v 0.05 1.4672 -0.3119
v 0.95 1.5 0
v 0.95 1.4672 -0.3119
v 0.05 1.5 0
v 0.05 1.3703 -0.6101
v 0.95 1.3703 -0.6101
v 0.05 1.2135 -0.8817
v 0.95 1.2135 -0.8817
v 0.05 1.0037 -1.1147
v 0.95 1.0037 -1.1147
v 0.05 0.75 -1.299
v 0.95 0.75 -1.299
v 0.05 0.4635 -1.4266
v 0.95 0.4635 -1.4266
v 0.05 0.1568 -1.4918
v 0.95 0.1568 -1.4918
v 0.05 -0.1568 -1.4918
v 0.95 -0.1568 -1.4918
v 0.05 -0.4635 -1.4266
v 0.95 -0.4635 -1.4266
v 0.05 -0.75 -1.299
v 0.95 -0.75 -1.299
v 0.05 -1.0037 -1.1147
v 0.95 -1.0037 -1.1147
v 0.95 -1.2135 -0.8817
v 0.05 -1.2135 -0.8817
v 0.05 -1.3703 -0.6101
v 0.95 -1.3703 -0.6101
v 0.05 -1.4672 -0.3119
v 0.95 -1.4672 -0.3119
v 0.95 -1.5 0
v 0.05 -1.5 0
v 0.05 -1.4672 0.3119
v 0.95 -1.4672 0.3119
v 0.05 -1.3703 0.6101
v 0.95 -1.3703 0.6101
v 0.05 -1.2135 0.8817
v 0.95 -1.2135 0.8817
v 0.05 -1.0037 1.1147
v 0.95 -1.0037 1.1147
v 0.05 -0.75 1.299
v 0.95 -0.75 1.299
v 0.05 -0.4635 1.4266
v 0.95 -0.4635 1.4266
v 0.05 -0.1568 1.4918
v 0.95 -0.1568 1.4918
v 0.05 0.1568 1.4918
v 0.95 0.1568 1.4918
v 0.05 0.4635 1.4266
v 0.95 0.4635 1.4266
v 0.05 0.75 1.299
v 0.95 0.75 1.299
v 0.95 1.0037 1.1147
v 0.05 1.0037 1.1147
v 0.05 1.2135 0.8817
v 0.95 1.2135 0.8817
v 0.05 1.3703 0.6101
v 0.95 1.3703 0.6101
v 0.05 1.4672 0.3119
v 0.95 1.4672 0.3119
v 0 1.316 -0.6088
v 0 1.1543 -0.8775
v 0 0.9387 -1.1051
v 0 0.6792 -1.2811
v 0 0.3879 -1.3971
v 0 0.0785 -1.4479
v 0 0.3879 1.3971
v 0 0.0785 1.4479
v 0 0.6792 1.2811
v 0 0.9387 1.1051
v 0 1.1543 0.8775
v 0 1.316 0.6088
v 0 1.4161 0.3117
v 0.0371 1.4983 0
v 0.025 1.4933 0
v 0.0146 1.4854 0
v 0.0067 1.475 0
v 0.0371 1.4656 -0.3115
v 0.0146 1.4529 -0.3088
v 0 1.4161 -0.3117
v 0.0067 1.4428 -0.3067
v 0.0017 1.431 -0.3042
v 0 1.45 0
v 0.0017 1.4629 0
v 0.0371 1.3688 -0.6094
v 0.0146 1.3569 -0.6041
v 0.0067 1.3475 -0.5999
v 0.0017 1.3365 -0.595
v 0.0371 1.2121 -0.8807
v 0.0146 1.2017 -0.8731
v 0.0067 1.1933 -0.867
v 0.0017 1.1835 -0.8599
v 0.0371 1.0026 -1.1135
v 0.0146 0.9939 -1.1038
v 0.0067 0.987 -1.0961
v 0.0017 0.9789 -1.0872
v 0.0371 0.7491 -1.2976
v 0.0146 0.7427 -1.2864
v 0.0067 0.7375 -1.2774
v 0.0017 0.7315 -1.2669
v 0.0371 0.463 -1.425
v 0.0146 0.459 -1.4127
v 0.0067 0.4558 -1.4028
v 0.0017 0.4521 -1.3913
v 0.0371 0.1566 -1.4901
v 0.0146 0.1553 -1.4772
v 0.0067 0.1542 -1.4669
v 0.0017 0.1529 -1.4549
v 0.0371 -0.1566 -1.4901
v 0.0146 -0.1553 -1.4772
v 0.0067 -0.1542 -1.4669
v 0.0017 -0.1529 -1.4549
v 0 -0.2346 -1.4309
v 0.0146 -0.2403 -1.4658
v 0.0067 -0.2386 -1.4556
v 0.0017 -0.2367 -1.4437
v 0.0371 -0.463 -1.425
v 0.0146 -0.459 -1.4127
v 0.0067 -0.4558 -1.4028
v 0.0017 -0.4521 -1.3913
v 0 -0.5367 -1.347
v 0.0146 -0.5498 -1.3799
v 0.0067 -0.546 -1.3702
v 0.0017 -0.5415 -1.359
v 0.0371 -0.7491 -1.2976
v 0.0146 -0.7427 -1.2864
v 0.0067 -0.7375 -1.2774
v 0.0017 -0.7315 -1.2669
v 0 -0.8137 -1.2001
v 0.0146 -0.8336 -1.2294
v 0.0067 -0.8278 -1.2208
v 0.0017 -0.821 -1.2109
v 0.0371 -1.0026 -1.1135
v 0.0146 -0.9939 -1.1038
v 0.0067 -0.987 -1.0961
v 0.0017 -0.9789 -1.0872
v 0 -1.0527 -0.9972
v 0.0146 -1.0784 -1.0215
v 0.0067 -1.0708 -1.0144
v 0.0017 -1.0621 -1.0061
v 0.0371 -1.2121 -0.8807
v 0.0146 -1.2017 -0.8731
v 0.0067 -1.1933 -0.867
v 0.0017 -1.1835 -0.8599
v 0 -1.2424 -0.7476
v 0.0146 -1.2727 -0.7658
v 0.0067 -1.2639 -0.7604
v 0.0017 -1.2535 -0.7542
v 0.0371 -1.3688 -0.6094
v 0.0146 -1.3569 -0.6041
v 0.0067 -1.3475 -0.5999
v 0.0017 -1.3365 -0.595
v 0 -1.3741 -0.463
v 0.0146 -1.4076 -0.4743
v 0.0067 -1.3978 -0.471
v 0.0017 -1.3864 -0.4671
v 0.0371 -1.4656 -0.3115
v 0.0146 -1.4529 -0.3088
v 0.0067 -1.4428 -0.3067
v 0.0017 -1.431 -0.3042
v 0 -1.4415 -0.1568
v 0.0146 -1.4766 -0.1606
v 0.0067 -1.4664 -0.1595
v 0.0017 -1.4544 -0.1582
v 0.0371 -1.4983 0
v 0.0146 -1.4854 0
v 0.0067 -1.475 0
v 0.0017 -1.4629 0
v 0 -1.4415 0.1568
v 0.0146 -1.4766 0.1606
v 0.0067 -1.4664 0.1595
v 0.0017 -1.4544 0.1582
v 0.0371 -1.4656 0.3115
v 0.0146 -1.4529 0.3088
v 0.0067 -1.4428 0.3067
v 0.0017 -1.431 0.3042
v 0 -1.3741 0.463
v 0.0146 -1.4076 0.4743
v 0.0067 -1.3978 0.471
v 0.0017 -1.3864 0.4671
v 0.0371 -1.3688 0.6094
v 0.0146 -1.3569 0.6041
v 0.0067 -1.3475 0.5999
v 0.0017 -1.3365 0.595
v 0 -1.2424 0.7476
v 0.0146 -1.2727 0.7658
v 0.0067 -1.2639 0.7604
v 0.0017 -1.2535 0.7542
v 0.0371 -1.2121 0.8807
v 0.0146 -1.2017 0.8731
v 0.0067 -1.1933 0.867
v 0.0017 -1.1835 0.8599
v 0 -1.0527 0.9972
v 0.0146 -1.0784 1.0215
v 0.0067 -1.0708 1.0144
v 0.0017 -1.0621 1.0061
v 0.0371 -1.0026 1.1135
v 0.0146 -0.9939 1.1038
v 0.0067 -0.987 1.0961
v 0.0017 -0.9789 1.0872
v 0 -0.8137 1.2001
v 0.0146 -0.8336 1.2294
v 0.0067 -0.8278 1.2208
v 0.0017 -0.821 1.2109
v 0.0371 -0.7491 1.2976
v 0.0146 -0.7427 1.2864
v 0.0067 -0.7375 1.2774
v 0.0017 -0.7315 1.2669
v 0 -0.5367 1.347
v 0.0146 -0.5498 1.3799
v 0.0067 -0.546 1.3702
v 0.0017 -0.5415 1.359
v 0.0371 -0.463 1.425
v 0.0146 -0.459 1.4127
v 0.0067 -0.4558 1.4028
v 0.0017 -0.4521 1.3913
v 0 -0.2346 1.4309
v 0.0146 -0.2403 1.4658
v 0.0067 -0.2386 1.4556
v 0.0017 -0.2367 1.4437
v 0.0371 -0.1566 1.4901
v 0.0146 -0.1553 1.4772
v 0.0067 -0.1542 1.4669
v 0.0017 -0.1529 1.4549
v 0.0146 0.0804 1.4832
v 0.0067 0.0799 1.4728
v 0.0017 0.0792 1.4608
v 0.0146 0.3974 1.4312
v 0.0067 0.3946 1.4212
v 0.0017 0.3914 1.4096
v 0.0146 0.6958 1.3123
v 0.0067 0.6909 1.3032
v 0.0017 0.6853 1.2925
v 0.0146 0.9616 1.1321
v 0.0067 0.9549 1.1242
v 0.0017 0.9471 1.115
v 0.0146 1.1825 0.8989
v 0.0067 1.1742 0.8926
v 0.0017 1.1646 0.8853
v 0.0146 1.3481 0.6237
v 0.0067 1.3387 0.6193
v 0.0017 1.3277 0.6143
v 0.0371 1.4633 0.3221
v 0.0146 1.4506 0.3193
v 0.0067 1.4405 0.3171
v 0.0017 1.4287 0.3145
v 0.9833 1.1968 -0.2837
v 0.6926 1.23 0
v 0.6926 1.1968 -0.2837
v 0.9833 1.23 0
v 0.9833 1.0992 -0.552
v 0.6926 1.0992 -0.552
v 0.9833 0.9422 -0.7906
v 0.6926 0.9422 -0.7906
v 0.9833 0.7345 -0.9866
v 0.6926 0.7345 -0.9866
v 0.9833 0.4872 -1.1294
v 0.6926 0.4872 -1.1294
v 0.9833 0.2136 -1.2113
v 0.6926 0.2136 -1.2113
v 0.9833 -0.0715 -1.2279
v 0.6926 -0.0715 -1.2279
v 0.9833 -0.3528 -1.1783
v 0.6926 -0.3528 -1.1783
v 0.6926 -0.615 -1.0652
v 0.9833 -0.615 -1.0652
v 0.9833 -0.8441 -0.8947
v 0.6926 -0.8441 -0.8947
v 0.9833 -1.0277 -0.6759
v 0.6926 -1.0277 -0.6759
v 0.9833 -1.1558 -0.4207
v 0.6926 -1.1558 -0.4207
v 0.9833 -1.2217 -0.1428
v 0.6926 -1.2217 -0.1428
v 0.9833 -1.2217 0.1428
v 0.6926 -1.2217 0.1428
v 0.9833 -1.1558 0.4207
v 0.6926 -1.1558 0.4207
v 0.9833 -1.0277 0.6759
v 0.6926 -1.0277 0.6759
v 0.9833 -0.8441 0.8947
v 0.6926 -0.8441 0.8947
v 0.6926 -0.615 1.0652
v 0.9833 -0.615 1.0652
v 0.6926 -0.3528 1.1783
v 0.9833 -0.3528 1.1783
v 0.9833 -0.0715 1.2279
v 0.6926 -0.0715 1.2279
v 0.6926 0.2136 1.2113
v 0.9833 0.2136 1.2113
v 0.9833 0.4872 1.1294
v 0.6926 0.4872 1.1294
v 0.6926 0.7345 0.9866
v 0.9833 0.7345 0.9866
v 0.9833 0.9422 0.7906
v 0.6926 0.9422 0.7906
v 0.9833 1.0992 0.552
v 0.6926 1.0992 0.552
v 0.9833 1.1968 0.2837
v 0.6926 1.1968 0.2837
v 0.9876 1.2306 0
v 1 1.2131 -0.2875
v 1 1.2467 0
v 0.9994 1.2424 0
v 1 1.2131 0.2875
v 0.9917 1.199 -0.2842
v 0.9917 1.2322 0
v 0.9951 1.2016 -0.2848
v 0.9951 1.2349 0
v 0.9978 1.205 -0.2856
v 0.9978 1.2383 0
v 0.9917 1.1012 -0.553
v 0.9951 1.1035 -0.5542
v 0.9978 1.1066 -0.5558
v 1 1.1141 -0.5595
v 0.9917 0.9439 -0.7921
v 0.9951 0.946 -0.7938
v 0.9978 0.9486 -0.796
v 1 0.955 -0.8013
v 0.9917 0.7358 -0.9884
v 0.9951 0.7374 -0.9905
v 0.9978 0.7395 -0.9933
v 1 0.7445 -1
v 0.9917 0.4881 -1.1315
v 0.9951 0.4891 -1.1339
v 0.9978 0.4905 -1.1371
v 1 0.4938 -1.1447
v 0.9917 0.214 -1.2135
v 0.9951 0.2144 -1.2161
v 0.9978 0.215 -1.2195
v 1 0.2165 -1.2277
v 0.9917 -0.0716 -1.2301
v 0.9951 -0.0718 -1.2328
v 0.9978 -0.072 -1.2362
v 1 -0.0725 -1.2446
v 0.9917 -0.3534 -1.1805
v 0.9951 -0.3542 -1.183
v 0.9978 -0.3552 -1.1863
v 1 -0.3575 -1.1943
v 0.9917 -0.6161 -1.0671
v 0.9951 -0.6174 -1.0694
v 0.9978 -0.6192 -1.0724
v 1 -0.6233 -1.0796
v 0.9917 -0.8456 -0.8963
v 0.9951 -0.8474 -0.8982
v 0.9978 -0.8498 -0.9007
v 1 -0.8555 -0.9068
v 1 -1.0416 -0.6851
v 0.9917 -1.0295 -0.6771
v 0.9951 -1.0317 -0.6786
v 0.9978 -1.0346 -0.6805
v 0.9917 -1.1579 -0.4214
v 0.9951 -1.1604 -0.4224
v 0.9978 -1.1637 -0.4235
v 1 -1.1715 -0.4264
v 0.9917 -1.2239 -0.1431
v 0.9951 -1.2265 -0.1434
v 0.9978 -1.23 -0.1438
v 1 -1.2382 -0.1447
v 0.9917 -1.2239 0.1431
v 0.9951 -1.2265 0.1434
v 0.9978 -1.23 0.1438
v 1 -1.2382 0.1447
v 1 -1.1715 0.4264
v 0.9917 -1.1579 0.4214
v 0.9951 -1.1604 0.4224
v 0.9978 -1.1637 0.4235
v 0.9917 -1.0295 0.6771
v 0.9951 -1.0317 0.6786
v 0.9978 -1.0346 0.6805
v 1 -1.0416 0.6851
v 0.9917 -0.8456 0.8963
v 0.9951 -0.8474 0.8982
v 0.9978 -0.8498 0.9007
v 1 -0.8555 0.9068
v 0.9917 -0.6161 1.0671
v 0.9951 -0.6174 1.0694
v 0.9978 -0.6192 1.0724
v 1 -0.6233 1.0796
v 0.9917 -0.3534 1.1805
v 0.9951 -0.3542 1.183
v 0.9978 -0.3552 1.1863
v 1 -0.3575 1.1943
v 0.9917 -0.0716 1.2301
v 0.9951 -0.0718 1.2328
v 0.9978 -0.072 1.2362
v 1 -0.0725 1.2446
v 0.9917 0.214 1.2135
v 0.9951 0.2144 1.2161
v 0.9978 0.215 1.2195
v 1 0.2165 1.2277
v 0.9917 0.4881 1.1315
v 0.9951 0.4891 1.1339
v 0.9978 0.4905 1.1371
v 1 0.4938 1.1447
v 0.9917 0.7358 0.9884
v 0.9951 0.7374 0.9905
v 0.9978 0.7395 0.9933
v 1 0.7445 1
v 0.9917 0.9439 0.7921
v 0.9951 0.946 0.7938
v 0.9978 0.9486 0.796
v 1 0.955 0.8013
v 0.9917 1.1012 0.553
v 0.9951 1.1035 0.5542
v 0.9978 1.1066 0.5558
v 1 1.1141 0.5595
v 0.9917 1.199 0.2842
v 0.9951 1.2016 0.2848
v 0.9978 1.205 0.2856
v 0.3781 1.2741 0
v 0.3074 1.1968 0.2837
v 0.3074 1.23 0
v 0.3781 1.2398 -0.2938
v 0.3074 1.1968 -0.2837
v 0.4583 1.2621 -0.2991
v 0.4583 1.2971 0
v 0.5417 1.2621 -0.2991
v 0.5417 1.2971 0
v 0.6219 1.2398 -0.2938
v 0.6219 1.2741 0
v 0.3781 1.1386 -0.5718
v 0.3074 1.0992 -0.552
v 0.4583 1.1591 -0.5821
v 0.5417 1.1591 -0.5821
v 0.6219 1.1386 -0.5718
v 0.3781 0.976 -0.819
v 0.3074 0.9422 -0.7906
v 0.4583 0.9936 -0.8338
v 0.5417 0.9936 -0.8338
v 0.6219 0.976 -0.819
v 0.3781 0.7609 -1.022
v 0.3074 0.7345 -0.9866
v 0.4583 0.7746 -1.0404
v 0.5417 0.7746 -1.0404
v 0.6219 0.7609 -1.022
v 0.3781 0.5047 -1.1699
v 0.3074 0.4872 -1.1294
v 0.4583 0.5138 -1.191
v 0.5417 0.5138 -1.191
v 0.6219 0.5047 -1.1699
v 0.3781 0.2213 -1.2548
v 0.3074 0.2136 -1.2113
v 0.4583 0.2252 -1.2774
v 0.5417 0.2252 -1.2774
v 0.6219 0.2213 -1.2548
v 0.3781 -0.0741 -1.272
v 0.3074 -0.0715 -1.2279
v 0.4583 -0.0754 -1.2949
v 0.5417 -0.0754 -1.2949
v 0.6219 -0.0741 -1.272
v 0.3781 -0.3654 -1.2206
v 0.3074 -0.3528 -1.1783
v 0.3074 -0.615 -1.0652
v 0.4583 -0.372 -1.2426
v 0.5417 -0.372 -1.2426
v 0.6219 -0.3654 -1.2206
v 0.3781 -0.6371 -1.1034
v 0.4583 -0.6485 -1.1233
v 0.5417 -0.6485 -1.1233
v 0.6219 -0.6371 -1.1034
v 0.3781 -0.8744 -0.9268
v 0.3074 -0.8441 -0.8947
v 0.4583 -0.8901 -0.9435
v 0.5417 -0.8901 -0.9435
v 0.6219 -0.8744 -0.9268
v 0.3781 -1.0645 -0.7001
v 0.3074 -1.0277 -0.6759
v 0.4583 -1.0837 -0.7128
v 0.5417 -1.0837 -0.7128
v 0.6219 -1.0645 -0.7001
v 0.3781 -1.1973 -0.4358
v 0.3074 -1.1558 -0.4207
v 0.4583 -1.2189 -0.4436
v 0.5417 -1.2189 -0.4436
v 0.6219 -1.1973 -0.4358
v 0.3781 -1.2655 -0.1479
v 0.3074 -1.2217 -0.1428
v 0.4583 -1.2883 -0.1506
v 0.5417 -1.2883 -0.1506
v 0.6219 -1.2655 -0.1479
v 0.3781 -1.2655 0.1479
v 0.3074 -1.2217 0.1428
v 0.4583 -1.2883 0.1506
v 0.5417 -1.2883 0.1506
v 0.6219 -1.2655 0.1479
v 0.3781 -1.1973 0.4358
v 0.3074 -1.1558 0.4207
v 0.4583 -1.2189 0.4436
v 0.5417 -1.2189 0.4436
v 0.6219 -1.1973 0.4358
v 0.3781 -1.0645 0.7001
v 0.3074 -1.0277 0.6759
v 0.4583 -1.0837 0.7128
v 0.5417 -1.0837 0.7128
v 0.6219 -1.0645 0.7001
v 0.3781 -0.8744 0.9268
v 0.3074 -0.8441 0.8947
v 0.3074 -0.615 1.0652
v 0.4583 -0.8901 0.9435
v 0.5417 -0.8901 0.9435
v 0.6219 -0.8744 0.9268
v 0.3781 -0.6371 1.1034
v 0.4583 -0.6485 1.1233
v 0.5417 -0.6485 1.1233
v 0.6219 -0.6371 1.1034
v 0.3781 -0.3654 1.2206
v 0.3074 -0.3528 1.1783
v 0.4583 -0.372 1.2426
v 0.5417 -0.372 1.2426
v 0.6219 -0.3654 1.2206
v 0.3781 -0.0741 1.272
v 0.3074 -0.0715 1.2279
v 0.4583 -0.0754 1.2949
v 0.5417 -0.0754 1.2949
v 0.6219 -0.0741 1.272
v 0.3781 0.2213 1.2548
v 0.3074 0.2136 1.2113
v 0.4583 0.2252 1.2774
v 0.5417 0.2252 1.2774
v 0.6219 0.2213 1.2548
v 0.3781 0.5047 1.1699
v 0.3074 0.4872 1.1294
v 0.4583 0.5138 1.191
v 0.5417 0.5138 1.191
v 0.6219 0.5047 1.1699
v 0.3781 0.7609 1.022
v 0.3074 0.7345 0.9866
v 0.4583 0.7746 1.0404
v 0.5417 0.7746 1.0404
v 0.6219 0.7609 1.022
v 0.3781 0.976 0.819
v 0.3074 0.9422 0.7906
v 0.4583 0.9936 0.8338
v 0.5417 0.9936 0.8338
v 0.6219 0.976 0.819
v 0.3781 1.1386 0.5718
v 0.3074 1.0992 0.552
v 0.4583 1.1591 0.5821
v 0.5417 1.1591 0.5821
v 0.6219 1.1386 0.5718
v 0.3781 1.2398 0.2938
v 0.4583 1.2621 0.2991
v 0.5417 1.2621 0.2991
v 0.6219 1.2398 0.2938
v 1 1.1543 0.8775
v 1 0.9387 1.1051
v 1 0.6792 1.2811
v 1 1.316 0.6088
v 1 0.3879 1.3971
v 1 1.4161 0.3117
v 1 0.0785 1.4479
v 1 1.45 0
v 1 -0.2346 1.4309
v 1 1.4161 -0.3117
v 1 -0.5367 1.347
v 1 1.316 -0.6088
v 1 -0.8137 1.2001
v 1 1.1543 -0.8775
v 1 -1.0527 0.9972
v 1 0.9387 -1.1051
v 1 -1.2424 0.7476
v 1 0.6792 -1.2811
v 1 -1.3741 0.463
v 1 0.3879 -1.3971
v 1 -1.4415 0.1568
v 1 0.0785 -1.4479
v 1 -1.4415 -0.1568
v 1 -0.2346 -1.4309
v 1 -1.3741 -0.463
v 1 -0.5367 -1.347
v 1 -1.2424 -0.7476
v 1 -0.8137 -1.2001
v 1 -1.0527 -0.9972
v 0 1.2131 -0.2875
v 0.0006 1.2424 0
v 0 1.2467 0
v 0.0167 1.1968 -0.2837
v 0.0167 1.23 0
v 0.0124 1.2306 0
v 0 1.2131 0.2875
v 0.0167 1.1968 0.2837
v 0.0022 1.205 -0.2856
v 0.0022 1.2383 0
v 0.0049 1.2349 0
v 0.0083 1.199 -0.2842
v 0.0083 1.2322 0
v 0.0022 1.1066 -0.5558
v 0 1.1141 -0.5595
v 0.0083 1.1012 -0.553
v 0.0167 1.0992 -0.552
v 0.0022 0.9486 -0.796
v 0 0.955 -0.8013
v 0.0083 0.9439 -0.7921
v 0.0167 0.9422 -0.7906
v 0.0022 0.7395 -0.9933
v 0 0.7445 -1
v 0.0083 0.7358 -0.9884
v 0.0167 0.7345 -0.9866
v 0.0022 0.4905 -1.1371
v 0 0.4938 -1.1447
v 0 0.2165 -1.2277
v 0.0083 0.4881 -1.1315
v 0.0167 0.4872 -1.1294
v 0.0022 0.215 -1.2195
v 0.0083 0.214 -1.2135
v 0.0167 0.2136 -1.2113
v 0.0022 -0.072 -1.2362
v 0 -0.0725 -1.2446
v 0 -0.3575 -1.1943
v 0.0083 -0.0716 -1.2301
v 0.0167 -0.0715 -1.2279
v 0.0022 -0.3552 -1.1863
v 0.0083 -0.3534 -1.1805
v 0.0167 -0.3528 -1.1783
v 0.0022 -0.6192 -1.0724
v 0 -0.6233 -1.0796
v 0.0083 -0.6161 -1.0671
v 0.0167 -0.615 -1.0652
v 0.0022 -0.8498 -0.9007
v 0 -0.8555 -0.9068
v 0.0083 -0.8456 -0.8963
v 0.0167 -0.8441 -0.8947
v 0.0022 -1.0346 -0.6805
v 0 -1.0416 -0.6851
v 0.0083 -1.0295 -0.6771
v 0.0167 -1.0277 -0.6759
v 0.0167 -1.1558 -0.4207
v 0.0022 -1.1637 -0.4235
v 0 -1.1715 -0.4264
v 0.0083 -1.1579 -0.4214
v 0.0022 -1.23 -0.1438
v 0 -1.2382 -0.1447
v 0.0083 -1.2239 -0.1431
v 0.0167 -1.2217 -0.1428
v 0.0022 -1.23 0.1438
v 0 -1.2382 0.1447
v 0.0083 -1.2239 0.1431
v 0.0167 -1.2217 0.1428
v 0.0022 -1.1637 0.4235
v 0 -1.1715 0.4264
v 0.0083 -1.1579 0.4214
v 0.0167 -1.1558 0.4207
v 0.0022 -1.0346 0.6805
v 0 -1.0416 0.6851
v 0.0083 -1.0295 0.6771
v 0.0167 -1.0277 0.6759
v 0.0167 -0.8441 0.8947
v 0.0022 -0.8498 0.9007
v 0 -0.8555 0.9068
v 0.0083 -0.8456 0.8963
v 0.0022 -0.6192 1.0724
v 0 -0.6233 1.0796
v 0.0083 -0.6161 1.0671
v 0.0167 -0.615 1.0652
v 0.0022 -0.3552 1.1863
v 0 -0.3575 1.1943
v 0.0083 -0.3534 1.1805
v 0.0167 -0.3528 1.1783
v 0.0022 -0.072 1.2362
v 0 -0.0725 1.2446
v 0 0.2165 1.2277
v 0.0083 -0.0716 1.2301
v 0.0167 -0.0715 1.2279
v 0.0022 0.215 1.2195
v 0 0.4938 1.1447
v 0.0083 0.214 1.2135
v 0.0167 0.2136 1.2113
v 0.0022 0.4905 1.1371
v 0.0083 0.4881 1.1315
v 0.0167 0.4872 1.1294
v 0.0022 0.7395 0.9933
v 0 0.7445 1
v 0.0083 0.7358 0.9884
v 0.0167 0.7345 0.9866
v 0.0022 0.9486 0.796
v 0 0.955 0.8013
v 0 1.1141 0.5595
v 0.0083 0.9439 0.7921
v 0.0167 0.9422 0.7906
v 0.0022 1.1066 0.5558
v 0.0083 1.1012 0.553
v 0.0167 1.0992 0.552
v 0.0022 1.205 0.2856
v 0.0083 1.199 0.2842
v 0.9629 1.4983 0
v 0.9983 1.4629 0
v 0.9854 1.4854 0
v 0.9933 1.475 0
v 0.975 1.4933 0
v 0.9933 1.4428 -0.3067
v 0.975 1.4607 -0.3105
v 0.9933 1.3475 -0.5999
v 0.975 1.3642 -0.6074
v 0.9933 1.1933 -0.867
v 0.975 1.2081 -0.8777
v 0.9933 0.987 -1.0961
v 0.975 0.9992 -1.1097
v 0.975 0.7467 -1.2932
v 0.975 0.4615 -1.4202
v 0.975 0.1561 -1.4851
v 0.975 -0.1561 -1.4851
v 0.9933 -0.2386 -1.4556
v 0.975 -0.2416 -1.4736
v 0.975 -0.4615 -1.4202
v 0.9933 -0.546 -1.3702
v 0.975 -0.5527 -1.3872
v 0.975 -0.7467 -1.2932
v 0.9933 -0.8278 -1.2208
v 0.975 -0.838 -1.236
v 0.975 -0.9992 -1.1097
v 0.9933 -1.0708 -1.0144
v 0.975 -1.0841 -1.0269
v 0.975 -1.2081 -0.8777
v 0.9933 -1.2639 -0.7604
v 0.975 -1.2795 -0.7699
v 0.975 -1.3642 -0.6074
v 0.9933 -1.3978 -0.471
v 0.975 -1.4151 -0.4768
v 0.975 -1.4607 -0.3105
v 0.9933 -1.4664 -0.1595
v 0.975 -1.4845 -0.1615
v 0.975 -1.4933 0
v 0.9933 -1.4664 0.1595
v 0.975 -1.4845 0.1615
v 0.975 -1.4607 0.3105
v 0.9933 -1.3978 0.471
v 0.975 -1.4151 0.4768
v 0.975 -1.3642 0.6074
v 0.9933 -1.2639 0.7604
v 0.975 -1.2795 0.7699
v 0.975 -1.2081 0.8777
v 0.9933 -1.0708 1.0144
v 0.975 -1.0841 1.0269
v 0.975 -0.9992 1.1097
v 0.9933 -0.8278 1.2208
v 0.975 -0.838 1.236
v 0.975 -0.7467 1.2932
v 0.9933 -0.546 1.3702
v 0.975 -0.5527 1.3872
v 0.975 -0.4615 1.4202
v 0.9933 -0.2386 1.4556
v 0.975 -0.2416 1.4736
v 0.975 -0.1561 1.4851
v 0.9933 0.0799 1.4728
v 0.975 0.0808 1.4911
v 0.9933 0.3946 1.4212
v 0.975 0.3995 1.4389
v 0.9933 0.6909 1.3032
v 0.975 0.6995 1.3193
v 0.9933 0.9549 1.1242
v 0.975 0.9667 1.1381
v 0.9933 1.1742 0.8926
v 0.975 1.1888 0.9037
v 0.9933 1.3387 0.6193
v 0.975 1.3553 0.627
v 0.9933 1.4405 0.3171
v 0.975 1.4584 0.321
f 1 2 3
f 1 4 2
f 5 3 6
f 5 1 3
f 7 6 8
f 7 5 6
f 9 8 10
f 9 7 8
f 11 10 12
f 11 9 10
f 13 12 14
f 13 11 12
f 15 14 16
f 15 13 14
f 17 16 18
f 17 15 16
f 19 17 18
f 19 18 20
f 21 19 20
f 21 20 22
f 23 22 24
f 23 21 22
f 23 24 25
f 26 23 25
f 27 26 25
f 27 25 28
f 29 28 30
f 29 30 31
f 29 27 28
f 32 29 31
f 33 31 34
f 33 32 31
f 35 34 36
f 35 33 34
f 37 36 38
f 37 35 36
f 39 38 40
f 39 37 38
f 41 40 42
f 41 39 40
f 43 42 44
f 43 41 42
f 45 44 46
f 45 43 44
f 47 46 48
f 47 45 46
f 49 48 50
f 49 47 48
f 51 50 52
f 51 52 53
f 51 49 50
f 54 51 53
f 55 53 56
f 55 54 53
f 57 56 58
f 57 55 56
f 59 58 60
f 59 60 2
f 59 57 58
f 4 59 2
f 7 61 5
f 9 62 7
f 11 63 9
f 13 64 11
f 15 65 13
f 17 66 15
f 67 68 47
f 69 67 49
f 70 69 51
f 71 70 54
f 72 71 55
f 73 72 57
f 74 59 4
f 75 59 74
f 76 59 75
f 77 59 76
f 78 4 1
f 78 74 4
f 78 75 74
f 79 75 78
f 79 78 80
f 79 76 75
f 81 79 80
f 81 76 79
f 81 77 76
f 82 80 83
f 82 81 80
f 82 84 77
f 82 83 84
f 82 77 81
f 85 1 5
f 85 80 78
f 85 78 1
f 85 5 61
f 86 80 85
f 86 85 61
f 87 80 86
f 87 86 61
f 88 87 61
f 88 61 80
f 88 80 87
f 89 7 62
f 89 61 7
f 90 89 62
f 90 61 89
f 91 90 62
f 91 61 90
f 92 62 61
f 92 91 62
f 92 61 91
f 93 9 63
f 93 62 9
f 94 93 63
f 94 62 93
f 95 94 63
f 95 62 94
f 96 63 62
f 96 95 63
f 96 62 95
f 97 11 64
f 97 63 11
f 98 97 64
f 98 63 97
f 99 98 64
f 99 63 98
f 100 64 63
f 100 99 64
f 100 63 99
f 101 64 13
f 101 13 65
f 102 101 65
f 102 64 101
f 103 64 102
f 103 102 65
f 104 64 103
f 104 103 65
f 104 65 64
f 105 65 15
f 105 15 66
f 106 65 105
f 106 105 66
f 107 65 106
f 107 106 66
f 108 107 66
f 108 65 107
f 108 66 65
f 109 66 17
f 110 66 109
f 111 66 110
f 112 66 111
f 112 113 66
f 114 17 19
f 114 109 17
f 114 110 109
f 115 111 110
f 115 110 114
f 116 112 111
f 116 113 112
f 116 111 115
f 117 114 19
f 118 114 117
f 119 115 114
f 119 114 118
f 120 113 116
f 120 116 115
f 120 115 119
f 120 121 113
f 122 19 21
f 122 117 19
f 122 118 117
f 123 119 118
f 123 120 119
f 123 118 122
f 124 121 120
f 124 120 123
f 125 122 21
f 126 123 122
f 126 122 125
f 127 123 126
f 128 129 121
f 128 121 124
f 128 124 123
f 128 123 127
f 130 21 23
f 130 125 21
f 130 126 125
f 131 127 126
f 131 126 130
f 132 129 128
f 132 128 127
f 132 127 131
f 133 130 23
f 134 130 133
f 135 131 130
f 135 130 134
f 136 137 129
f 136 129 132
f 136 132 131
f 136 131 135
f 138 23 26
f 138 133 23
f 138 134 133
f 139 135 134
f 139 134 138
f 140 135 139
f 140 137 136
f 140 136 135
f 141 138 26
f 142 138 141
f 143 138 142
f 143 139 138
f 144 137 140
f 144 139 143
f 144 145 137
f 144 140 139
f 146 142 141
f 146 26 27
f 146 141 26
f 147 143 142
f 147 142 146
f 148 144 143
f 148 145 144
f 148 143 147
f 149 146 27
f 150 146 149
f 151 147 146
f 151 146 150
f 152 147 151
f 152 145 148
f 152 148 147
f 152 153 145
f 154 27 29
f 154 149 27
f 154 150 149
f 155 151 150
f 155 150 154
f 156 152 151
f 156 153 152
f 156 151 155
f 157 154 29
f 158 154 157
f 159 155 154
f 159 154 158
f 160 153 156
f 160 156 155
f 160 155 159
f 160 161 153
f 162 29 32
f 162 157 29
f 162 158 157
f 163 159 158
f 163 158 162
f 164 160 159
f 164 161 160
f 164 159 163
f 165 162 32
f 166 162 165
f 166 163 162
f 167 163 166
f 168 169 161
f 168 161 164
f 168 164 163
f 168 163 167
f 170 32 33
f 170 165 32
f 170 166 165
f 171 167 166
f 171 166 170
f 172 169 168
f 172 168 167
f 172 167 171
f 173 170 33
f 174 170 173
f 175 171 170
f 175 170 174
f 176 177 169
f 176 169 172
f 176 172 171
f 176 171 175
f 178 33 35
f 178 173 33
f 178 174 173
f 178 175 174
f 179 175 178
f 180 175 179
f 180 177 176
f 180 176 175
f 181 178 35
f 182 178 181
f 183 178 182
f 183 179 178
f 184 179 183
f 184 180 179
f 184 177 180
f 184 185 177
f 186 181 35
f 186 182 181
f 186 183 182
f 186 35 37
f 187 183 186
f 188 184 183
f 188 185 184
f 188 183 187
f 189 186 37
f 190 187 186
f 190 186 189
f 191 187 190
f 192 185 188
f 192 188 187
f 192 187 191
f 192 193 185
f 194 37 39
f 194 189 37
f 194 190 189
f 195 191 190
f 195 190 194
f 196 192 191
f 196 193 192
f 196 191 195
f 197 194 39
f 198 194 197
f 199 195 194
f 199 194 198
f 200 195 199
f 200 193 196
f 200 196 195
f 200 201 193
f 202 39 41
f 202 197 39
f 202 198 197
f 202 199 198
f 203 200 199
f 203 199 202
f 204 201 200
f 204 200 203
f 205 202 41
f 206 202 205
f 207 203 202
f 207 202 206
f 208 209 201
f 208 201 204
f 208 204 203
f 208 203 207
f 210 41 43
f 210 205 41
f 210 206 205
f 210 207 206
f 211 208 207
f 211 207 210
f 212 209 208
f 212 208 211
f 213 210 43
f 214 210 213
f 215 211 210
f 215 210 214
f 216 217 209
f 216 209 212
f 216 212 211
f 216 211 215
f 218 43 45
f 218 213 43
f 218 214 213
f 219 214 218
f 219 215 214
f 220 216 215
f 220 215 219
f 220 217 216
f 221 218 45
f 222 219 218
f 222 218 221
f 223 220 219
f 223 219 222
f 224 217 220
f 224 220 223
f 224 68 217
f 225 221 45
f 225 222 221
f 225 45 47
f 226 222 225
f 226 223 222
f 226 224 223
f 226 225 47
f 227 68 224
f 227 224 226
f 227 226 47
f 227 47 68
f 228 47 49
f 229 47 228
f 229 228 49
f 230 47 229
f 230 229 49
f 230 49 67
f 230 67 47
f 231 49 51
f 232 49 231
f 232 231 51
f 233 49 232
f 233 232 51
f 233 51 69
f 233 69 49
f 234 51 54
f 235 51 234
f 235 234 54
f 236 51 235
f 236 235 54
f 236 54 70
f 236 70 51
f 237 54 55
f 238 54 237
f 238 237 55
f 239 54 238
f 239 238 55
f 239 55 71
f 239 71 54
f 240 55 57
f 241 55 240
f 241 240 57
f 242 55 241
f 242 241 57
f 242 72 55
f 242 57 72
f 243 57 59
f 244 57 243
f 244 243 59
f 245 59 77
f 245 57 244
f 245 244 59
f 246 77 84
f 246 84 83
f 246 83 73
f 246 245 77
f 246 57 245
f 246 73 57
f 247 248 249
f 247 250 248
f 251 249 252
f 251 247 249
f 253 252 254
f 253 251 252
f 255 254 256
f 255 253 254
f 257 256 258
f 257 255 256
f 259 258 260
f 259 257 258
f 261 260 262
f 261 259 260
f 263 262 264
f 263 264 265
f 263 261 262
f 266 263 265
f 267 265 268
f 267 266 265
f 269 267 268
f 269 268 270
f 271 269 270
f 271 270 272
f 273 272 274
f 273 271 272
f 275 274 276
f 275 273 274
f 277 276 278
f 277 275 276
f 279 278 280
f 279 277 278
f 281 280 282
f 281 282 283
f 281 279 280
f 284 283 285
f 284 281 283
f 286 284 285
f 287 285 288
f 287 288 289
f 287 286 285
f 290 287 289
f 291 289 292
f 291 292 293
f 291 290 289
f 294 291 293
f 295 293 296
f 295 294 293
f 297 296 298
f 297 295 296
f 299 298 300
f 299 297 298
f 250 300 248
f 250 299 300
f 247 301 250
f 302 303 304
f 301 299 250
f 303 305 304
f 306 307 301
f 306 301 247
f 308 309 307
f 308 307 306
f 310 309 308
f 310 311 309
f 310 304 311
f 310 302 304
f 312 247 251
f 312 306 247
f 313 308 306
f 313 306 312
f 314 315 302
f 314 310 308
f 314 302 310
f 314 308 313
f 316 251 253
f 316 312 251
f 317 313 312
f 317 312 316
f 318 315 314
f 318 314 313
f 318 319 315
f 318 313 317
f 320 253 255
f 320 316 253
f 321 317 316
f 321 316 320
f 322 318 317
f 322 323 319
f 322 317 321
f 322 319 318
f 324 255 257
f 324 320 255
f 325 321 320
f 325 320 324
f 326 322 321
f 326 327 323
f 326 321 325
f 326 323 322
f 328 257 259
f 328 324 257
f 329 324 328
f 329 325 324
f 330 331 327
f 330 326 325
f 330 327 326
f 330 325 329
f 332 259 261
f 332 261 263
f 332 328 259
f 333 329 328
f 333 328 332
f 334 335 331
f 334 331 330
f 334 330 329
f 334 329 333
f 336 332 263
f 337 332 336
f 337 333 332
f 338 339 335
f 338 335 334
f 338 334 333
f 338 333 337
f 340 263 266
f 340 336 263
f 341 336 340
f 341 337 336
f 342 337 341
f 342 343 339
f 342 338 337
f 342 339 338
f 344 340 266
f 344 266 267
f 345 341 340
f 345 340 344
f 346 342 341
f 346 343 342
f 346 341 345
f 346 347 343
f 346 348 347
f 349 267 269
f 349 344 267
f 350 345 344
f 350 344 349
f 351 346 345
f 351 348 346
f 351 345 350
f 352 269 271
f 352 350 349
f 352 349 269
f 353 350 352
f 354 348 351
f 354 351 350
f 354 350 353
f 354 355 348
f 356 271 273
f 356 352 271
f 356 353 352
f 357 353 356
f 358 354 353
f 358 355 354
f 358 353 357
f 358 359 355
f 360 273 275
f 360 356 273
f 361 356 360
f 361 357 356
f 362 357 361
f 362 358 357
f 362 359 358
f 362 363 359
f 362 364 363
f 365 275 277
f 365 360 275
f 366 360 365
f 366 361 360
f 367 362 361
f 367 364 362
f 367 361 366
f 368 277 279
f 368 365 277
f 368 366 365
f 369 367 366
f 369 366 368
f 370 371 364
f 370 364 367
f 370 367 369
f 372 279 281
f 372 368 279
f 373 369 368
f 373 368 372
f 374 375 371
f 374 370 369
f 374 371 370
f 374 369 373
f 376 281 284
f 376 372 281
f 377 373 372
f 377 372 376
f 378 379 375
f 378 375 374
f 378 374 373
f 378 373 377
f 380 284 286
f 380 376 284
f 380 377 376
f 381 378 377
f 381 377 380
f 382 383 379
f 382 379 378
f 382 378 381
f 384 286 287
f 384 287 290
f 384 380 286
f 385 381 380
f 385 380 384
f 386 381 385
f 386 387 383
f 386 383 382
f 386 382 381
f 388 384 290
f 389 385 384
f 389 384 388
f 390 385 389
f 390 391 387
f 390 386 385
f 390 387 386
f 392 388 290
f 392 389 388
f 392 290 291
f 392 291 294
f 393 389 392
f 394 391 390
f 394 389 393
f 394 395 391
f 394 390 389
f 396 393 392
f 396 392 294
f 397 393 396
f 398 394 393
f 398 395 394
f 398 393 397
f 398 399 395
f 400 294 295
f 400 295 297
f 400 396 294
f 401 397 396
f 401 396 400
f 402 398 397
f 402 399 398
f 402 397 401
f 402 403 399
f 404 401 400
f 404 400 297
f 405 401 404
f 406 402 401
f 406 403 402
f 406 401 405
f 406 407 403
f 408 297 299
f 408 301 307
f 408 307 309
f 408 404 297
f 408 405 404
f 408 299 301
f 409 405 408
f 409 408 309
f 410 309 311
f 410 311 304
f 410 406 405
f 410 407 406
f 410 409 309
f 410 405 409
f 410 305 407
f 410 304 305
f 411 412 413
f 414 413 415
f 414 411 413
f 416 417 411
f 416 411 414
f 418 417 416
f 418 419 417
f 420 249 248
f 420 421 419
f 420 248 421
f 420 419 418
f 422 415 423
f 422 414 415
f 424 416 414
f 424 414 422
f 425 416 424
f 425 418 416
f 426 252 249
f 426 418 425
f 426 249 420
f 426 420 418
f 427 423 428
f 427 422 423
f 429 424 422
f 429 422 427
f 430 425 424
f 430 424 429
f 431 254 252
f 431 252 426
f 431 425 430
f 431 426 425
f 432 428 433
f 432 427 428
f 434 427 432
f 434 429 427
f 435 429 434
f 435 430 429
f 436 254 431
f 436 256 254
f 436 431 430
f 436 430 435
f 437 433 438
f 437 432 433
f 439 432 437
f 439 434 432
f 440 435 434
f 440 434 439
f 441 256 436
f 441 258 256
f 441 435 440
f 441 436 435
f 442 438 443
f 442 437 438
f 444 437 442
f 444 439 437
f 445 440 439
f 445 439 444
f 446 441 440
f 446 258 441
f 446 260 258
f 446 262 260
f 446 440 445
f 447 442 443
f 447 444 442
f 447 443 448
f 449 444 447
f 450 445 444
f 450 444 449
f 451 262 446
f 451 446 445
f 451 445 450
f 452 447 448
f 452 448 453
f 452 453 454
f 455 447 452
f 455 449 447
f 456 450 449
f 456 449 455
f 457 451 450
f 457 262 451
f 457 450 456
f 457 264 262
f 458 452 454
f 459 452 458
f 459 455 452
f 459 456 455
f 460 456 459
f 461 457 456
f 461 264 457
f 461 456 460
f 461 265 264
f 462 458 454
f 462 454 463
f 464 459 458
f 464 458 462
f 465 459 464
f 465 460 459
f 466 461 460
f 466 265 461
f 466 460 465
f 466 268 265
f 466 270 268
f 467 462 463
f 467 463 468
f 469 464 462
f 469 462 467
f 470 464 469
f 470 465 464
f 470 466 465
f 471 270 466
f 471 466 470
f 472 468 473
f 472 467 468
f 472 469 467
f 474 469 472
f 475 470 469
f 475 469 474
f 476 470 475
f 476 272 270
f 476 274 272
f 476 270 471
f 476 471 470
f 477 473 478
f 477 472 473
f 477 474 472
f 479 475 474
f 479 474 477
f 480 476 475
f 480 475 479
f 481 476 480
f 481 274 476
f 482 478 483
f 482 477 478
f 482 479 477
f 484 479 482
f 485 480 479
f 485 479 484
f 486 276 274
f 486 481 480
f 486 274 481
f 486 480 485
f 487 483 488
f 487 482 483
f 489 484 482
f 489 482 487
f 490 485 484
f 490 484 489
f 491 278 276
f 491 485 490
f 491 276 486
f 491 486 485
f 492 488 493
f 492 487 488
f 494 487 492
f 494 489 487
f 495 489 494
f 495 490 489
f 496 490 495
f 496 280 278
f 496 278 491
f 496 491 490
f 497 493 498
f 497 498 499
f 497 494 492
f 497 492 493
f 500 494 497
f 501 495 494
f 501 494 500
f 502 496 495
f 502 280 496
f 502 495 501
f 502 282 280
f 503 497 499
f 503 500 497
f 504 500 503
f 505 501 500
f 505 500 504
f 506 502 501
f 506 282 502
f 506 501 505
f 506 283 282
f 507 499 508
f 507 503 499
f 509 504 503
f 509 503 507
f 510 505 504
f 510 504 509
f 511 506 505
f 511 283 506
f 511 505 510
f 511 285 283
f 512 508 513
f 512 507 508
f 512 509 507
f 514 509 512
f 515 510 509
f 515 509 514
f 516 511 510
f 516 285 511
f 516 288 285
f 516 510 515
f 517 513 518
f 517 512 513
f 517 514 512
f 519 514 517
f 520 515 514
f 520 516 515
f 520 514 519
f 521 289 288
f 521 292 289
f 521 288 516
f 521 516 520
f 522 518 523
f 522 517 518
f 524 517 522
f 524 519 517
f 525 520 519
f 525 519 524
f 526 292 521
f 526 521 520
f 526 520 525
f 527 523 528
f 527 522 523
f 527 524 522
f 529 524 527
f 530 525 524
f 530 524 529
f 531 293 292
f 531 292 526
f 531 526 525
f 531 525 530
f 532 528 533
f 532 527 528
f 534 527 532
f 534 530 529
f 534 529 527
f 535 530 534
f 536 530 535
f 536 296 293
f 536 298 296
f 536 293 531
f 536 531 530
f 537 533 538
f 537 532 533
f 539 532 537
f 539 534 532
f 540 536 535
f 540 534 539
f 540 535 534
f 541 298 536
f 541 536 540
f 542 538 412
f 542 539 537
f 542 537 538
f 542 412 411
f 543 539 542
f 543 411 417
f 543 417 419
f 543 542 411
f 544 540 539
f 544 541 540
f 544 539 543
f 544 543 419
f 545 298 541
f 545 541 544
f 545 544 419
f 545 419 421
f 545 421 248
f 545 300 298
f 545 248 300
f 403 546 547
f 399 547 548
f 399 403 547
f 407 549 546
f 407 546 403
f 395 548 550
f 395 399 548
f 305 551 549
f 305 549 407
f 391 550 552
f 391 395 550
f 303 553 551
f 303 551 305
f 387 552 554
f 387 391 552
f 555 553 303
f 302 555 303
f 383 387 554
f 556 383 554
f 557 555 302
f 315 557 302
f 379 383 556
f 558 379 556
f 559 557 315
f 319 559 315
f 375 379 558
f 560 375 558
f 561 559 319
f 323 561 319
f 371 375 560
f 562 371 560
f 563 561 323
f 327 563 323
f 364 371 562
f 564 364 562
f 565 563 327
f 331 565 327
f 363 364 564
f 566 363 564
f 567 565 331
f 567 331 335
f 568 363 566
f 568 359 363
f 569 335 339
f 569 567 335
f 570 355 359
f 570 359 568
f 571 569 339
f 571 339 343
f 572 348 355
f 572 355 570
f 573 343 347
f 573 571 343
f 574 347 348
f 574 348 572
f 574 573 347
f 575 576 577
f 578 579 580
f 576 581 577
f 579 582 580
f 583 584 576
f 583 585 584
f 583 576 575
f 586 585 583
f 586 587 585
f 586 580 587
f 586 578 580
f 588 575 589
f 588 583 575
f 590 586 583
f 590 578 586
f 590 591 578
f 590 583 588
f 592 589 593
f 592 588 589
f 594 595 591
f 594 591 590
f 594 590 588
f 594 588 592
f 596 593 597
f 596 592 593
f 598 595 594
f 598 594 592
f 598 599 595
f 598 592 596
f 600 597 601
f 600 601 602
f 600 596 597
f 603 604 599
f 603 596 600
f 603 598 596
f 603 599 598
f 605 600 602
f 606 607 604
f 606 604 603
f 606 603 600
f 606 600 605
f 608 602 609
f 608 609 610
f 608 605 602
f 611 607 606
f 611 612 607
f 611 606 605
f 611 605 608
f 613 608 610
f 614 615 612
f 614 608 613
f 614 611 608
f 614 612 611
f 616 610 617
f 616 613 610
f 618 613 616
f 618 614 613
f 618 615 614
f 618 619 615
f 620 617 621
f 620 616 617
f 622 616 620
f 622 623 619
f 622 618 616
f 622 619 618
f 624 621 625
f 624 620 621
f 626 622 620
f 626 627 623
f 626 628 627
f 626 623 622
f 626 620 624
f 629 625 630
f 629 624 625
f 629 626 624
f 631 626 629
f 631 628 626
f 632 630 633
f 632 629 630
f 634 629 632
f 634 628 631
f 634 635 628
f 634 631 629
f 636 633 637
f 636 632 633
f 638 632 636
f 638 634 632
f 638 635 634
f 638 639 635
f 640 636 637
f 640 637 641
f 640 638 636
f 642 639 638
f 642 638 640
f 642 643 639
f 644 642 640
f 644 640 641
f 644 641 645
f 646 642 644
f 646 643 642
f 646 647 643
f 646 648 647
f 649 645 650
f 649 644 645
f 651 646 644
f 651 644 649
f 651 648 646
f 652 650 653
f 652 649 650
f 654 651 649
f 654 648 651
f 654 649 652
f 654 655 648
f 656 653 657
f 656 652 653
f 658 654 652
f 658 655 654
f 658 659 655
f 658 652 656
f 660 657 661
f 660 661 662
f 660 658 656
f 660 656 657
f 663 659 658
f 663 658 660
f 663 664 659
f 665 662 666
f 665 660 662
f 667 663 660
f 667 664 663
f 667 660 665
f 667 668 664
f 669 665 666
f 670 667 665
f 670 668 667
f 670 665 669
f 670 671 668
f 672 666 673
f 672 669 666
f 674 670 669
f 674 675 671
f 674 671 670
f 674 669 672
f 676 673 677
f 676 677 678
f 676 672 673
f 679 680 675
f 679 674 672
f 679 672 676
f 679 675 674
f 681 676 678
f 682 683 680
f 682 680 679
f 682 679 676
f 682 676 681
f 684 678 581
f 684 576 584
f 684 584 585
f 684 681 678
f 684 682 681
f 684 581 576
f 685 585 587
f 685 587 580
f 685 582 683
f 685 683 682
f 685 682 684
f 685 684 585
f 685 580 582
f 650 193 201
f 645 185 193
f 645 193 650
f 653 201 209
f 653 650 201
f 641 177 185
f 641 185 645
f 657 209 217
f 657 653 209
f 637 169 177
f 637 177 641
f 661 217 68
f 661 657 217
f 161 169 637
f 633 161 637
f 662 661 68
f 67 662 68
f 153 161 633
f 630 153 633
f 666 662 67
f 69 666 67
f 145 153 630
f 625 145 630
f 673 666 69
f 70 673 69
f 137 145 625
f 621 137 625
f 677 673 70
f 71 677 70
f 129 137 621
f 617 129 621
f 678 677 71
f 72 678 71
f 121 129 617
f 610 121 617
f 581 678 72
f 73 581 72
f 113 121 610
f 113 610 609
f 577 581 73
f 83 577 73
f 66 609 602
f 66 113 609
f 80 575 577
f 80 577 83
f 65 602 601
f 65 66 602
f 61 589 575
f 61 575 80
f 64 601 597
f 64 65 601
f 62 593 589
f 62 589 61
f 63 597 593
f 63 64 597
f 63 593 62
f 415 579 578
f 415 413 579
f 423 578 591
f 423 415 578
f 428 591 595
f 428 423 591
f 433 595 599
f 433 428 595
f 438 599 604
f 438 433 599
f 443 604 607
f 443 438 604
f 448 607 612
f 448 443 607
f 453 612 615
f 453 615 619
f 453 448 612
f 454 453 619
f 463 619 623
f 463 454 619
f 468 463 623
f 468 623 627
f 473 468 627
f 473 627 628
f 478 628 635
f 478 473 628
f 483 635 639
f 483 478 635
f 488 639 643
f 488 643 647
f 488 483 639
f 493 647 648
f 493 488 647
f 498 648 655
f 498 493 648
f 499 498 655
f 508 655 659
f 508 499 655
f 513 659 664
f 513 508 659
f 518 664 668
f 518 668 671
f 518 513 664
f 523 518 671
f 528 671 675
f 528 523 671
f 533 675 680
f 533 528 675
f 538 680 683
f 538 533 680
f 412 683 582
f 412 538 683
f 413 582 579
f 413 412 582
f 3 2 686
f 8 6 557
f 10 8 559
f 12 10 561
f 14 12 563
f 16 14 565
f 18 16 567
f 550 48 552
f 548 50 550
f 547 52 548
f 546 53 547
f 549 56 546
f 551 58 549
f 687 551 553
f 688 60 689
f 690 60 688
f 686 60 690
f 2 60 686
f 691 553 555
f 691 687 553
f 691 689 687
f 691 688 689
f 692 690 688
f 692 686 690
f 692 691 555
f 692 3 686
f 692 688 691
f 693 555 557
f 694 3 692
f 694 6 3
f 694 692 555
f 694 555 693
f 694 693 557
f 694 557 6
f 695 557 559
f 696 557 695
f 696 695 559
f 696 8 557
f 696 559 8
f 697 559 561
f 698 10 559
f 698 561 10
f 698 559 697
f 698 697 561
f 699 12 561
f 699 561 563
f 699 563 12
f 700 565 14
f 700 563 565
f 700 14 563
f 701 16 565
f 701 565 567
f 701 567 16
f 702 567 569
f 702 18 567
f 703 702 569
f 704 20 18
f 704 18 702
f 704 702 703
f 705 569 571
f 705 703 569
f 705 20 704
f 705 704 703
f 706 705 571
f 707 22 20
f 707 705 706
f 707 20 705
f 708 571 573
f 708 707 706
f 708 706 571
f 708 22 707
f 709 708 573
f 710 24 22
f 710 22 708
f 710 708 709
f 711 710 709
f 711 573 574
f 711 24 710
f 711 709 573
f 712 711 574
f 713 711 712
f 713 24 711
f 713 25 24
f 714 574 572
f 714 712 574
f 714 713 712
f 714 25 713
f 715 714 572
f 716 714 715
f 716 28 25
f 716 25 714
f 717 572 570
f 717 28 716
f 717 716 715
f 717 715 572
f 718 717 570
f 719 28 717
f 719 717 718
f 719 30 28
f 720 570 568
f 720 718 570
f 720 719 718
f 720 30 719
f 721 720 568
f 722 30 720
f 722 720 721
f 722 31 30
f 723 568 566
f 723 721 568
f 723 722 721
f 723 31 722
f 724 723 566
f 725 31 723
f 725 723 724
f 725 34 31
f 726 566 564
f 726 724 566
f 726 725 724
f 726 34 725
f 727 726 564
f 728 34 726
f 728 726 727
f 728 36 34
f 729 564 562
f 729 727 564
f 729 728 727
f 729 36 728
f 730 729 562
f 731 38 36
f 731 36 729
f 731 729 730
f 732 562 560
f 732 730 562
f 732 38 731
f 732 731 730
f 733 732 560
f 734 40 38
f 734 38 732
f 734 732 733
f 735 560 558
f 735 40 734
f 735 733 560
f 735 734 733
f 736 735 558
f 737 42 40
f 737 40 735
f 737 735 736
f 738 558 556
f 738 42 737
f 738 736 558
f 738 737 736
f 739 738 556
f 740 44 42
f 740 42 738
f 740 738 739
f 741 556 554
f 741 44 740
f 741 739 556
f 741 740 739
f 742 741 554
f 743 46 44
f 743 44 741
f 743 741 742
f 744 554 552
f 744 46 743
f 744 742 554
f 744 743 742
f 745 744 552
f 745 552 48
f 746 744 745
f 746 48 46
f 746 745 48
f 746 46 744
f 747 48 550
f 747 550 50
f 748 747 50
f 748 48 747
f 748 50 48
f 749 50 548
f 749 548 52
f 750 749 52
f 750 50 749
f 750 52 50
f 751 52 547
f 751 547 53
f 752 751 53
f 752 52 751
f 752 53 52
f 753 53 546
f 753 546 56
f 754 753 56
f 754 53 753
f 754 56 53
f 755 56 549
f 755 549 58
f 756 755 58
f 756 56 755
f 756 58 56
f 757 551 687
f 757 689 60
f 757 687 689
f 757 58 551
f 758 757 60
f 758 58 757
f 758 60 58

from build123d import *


with BuildPart() as part:
    # Sketch1 → Revolve1 (revolve)
    with BuildSketch(Plane.XY):
        with BuildLine():
            Line((0.016666667, 1.23), (0.307386397, 1.23))
            ThreePointArc((0.307386397, 1.23), (0.5, 1.3), (0.692613603, 1.23))
            Line((0.692613603, 1.23), (0.983333333, 1.23))
            ThreePointArc((0.983333333, 1.23), (0.995118446, 1.234881554), (1, 1.246666667))
            Line((1, 1.246666667), (1, 1.45))
            ThreePointArc((1, 1.45), (0.985355339, 1.485355339), (0.95, 1.5))
            Line((0.95, 1.5), (0.05, 1.5))
            ThreePointArc((0.05, 1.5), (0.014644661, 1.485355339), (0, 1.45))
            Line((0, 1.45), (0, 1.246666667))
            ThreePointArc((0, 1.246666667), (0.004881554, 1.234881554), (0.016666667, 1.23))
        make_face()
    revolve(axis=Axis((1, 0, 0), (-1, 0, 0)))


solid = part.part
